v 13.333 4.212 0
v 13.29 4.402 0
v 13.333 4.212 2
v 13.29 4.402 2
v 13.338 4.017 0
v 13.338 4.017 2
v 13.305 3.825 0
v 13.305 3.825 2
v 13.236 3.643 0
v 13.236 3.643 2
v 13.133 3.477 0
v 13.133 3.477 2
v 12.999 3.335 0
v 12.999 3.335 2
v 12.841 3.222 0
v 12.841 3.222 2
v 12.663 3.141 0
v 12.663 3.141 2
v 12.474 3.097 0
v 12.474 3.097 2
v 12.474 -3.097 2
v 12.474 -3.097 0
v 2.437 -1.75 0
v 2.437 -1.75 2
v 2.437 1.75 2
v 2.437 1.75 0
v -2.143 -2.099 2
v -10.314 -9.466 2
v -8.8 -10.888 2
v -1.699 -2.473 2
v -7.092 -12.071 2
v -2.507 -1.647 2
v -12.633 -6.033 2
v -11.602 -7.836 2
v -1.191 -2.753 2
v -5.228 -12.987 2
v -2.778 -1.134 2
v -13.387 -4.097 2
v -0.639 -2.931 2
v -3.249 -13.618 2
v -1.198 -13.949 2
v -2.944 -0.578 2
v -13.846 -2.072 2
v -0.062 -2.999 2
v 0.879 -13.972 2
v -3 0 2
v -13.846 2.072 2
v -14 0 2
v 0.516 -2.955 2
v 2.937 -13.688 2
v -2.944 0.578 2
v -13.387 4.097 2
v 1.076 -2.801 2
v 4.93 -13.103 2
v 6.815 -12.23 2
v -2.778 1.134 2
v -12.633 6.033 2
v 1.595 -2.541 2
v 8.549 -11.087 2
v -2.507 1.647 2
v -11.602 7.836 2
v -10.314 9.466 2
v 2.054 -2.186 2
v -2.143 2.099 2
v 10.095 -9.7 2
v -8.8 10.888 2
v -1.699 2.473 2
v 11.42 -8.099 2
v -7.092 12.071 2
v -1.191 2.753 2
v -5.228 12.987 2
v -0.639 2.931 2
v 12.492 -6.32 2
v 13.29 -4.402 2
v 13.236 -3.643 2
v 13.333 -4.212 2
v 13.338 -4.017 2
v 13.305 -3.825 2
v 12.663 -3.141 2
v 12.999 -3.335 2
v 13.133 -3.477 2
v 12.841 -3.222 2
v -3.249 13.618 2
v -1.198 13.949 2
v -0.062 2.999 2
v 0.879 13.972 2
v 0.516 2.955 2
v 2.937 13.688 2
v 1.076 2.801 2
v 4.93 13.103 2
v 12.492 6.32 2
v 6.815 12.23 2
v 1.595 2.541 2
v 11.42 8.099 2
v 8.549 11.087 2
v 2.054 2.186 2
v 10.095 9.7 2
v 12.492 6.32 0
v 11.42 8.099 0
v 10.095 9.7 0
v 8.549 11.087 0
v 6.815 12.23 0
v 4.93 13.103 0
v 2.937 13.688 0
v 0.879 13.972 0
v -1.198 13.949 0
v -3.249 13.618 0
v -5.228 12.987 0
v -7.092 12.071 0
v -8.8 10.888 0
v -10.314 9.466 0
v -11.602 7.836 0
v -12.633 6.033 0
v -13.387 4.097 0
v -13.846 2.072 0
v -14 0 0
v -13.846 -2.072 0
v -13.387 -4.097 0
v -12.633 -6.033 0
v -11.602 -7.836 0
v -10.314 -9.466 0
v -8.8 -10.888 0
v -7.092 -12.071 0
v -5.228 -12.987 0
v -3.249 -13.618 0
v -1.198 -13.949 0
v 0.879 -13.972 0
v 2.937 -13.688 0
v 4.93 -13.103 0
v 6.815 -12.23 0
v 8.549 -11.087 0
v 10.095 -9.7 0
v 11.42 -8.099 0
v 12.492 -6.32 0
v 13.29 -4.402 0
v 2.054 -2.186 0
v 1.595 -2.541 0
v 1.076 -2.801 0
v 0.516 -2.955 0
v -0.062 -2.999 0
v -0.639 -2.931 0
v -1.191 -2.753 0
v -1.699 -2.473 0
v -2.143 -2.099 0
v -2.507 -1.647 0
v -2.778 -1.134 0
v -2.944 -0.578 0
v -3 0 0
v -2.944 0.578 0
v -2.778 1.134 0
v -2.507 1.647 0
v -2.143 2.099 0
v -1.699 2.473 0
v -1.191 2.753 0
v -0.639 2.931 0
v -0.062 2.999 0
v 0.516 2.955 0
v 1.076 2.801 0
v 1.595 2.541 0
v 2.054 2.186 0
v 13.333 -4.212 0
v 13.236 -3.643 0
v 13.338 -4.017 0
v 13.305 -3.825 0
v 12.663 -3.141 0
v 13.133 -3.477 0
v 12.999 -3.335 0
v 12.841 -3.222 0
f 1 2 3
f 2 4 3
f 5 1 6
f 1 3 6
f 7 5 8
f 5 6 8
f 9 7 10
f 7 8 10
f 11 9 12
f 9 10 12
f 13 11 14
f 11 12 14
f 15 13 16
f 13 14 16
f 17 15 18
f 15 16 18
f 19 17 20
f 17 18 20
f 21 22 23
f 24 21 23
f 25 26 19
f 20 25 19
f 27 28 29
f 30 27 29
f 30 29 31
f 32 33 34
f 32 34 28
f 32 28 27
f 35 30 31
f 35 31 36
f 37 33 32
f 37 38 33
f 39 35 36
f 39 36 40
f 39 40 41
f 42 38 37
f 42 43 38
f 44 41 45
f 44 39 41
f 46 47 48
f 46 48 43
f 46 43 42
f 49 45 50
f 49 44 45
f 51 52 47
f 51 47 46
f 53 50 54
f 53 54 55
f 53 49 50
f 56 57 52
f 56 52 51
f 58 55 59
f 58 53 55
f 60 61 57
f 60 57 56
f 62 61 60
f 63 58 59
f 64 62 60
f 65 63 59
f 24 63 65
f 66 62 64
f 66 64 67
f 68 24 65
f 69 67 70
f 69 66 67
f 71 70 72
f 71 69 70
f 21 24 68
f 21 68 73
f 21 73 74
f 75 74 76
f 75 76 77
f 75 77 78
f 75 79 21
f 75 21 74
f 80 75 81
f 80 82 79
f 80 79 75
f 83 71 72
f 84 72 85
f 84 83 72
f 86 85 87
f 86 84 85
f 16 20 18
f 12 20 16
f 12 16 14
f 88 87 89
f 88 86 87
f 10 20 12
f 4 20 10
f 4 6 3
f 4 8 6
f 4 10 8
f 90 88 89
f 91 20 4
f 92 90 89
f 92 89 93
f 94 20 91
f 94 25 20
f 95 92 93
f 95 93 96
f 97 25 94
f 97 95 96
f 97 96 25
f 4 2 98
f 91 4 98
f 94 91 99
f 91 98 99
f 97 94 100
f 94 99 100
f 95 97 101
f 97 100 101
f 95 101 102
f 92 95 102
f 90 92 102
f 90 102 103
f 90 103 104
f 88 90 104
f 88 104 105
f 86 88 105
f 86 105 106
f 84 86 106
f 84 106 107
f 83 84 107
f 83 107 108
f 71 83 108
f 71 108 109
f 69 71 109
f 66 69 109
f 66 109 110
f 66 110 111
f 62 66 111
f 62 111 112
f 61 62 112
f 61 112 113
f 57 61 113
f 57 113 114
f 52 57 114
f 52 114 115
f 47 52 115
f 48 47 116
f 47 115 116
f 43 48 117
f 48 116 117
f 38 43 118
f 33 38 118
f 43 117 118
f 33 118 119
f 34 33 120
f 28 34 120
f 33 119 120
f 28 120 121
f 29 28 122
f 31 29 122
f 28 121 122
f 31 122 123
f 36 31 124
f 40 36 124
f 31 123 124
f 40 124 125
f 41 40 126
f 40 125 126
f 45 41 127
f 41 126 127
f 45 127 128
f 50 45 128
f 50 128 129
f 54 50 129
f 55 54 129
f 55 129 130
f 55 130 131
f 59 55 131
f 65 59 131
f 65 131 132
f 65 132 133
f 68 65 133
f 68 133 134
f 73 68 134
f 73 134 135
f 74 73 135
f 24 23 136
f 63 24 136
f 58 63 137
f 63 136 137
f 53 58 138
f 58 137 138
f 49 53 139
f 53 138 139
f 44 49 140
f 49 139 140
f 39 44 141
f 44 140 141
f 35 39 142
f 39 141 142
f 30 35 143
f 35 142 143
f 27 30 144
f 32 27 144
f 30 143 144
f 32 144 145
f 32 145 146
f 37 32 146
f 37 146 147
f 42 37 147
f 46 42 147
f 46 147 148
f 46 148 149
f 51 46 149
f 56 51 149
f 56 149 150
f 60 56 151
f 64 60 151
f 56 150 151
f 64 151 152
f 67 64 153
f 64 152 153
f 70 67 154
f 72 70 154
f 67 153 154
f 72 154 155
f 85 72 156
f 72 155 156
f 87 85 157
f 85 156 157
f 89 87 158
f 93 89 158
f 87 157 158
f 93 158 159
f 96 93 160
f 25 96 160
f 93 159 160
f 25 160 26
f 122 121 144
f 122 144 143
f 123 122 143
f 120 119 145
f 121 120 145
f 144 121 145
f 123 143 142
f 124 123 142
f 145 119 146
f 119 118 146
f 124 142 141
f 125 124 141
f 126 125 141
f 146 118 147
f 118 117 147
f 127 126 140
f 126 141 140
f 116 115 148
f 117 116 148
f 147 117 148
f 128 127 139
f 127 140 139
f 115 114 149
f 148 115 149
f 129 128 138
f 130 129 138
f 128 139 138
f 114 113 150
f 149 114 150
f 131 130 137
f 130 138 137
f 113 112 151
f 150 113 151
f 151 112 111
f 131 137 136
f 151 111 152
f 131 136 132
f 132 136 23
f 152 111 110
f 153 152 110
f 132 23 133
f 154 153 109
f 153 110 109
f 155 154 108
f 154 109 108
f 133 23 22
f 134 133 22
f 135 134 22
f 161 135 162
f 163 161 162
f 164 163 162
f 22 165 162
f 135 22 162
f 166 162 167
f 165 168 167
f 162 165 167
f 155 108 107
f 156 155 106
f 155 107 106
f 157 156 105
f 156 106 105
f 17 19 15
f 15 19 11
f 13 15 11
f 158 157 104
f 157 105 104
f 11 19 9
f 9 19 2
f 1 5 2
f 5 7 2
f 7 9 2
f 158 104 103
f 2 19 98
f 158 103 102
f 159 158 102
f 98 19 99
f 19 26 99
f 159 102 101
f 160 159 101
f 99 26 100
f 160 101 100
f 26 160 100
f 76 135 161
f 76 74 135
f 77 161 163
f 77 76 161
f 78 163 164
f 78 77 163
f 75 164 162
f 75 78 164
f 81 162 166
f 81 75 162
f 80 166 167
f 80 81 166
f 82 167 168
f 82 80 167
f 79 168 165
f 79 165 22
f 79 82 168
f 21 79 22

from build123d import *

# Parameters (mm, degrees)
F1_DEPTH = 2
F2_R     = 1


with BuildPart() as f1:
    # F0 (on Top) → F1 (new body)
    with BuildSketch(Plane.XY):
        with BuildLine():
            ThreePointArc((13.617544, 3.25), (-14, 0), (13.617544, -3.25))
            Line((13.617544, -3.25), (2.436699, -1.75))
            ThreePointArc((2.436699, -1.75), (-3, 0), (2.436699, 1.75))
            Line((2.436699, 1.75), (13.617544, 3.25))
        make_face()
    extrude(amount=F1_DEPTH)

    # F2
    f2_edges = [f1.edges().sort_by_distance(p)[0] for p in [
        (13.617544, 3.25, 1),
        (13.617544, -3.25, 1),
    ]]
    fillet(f2_edges, radius=F2_R)


solid = f1.part
